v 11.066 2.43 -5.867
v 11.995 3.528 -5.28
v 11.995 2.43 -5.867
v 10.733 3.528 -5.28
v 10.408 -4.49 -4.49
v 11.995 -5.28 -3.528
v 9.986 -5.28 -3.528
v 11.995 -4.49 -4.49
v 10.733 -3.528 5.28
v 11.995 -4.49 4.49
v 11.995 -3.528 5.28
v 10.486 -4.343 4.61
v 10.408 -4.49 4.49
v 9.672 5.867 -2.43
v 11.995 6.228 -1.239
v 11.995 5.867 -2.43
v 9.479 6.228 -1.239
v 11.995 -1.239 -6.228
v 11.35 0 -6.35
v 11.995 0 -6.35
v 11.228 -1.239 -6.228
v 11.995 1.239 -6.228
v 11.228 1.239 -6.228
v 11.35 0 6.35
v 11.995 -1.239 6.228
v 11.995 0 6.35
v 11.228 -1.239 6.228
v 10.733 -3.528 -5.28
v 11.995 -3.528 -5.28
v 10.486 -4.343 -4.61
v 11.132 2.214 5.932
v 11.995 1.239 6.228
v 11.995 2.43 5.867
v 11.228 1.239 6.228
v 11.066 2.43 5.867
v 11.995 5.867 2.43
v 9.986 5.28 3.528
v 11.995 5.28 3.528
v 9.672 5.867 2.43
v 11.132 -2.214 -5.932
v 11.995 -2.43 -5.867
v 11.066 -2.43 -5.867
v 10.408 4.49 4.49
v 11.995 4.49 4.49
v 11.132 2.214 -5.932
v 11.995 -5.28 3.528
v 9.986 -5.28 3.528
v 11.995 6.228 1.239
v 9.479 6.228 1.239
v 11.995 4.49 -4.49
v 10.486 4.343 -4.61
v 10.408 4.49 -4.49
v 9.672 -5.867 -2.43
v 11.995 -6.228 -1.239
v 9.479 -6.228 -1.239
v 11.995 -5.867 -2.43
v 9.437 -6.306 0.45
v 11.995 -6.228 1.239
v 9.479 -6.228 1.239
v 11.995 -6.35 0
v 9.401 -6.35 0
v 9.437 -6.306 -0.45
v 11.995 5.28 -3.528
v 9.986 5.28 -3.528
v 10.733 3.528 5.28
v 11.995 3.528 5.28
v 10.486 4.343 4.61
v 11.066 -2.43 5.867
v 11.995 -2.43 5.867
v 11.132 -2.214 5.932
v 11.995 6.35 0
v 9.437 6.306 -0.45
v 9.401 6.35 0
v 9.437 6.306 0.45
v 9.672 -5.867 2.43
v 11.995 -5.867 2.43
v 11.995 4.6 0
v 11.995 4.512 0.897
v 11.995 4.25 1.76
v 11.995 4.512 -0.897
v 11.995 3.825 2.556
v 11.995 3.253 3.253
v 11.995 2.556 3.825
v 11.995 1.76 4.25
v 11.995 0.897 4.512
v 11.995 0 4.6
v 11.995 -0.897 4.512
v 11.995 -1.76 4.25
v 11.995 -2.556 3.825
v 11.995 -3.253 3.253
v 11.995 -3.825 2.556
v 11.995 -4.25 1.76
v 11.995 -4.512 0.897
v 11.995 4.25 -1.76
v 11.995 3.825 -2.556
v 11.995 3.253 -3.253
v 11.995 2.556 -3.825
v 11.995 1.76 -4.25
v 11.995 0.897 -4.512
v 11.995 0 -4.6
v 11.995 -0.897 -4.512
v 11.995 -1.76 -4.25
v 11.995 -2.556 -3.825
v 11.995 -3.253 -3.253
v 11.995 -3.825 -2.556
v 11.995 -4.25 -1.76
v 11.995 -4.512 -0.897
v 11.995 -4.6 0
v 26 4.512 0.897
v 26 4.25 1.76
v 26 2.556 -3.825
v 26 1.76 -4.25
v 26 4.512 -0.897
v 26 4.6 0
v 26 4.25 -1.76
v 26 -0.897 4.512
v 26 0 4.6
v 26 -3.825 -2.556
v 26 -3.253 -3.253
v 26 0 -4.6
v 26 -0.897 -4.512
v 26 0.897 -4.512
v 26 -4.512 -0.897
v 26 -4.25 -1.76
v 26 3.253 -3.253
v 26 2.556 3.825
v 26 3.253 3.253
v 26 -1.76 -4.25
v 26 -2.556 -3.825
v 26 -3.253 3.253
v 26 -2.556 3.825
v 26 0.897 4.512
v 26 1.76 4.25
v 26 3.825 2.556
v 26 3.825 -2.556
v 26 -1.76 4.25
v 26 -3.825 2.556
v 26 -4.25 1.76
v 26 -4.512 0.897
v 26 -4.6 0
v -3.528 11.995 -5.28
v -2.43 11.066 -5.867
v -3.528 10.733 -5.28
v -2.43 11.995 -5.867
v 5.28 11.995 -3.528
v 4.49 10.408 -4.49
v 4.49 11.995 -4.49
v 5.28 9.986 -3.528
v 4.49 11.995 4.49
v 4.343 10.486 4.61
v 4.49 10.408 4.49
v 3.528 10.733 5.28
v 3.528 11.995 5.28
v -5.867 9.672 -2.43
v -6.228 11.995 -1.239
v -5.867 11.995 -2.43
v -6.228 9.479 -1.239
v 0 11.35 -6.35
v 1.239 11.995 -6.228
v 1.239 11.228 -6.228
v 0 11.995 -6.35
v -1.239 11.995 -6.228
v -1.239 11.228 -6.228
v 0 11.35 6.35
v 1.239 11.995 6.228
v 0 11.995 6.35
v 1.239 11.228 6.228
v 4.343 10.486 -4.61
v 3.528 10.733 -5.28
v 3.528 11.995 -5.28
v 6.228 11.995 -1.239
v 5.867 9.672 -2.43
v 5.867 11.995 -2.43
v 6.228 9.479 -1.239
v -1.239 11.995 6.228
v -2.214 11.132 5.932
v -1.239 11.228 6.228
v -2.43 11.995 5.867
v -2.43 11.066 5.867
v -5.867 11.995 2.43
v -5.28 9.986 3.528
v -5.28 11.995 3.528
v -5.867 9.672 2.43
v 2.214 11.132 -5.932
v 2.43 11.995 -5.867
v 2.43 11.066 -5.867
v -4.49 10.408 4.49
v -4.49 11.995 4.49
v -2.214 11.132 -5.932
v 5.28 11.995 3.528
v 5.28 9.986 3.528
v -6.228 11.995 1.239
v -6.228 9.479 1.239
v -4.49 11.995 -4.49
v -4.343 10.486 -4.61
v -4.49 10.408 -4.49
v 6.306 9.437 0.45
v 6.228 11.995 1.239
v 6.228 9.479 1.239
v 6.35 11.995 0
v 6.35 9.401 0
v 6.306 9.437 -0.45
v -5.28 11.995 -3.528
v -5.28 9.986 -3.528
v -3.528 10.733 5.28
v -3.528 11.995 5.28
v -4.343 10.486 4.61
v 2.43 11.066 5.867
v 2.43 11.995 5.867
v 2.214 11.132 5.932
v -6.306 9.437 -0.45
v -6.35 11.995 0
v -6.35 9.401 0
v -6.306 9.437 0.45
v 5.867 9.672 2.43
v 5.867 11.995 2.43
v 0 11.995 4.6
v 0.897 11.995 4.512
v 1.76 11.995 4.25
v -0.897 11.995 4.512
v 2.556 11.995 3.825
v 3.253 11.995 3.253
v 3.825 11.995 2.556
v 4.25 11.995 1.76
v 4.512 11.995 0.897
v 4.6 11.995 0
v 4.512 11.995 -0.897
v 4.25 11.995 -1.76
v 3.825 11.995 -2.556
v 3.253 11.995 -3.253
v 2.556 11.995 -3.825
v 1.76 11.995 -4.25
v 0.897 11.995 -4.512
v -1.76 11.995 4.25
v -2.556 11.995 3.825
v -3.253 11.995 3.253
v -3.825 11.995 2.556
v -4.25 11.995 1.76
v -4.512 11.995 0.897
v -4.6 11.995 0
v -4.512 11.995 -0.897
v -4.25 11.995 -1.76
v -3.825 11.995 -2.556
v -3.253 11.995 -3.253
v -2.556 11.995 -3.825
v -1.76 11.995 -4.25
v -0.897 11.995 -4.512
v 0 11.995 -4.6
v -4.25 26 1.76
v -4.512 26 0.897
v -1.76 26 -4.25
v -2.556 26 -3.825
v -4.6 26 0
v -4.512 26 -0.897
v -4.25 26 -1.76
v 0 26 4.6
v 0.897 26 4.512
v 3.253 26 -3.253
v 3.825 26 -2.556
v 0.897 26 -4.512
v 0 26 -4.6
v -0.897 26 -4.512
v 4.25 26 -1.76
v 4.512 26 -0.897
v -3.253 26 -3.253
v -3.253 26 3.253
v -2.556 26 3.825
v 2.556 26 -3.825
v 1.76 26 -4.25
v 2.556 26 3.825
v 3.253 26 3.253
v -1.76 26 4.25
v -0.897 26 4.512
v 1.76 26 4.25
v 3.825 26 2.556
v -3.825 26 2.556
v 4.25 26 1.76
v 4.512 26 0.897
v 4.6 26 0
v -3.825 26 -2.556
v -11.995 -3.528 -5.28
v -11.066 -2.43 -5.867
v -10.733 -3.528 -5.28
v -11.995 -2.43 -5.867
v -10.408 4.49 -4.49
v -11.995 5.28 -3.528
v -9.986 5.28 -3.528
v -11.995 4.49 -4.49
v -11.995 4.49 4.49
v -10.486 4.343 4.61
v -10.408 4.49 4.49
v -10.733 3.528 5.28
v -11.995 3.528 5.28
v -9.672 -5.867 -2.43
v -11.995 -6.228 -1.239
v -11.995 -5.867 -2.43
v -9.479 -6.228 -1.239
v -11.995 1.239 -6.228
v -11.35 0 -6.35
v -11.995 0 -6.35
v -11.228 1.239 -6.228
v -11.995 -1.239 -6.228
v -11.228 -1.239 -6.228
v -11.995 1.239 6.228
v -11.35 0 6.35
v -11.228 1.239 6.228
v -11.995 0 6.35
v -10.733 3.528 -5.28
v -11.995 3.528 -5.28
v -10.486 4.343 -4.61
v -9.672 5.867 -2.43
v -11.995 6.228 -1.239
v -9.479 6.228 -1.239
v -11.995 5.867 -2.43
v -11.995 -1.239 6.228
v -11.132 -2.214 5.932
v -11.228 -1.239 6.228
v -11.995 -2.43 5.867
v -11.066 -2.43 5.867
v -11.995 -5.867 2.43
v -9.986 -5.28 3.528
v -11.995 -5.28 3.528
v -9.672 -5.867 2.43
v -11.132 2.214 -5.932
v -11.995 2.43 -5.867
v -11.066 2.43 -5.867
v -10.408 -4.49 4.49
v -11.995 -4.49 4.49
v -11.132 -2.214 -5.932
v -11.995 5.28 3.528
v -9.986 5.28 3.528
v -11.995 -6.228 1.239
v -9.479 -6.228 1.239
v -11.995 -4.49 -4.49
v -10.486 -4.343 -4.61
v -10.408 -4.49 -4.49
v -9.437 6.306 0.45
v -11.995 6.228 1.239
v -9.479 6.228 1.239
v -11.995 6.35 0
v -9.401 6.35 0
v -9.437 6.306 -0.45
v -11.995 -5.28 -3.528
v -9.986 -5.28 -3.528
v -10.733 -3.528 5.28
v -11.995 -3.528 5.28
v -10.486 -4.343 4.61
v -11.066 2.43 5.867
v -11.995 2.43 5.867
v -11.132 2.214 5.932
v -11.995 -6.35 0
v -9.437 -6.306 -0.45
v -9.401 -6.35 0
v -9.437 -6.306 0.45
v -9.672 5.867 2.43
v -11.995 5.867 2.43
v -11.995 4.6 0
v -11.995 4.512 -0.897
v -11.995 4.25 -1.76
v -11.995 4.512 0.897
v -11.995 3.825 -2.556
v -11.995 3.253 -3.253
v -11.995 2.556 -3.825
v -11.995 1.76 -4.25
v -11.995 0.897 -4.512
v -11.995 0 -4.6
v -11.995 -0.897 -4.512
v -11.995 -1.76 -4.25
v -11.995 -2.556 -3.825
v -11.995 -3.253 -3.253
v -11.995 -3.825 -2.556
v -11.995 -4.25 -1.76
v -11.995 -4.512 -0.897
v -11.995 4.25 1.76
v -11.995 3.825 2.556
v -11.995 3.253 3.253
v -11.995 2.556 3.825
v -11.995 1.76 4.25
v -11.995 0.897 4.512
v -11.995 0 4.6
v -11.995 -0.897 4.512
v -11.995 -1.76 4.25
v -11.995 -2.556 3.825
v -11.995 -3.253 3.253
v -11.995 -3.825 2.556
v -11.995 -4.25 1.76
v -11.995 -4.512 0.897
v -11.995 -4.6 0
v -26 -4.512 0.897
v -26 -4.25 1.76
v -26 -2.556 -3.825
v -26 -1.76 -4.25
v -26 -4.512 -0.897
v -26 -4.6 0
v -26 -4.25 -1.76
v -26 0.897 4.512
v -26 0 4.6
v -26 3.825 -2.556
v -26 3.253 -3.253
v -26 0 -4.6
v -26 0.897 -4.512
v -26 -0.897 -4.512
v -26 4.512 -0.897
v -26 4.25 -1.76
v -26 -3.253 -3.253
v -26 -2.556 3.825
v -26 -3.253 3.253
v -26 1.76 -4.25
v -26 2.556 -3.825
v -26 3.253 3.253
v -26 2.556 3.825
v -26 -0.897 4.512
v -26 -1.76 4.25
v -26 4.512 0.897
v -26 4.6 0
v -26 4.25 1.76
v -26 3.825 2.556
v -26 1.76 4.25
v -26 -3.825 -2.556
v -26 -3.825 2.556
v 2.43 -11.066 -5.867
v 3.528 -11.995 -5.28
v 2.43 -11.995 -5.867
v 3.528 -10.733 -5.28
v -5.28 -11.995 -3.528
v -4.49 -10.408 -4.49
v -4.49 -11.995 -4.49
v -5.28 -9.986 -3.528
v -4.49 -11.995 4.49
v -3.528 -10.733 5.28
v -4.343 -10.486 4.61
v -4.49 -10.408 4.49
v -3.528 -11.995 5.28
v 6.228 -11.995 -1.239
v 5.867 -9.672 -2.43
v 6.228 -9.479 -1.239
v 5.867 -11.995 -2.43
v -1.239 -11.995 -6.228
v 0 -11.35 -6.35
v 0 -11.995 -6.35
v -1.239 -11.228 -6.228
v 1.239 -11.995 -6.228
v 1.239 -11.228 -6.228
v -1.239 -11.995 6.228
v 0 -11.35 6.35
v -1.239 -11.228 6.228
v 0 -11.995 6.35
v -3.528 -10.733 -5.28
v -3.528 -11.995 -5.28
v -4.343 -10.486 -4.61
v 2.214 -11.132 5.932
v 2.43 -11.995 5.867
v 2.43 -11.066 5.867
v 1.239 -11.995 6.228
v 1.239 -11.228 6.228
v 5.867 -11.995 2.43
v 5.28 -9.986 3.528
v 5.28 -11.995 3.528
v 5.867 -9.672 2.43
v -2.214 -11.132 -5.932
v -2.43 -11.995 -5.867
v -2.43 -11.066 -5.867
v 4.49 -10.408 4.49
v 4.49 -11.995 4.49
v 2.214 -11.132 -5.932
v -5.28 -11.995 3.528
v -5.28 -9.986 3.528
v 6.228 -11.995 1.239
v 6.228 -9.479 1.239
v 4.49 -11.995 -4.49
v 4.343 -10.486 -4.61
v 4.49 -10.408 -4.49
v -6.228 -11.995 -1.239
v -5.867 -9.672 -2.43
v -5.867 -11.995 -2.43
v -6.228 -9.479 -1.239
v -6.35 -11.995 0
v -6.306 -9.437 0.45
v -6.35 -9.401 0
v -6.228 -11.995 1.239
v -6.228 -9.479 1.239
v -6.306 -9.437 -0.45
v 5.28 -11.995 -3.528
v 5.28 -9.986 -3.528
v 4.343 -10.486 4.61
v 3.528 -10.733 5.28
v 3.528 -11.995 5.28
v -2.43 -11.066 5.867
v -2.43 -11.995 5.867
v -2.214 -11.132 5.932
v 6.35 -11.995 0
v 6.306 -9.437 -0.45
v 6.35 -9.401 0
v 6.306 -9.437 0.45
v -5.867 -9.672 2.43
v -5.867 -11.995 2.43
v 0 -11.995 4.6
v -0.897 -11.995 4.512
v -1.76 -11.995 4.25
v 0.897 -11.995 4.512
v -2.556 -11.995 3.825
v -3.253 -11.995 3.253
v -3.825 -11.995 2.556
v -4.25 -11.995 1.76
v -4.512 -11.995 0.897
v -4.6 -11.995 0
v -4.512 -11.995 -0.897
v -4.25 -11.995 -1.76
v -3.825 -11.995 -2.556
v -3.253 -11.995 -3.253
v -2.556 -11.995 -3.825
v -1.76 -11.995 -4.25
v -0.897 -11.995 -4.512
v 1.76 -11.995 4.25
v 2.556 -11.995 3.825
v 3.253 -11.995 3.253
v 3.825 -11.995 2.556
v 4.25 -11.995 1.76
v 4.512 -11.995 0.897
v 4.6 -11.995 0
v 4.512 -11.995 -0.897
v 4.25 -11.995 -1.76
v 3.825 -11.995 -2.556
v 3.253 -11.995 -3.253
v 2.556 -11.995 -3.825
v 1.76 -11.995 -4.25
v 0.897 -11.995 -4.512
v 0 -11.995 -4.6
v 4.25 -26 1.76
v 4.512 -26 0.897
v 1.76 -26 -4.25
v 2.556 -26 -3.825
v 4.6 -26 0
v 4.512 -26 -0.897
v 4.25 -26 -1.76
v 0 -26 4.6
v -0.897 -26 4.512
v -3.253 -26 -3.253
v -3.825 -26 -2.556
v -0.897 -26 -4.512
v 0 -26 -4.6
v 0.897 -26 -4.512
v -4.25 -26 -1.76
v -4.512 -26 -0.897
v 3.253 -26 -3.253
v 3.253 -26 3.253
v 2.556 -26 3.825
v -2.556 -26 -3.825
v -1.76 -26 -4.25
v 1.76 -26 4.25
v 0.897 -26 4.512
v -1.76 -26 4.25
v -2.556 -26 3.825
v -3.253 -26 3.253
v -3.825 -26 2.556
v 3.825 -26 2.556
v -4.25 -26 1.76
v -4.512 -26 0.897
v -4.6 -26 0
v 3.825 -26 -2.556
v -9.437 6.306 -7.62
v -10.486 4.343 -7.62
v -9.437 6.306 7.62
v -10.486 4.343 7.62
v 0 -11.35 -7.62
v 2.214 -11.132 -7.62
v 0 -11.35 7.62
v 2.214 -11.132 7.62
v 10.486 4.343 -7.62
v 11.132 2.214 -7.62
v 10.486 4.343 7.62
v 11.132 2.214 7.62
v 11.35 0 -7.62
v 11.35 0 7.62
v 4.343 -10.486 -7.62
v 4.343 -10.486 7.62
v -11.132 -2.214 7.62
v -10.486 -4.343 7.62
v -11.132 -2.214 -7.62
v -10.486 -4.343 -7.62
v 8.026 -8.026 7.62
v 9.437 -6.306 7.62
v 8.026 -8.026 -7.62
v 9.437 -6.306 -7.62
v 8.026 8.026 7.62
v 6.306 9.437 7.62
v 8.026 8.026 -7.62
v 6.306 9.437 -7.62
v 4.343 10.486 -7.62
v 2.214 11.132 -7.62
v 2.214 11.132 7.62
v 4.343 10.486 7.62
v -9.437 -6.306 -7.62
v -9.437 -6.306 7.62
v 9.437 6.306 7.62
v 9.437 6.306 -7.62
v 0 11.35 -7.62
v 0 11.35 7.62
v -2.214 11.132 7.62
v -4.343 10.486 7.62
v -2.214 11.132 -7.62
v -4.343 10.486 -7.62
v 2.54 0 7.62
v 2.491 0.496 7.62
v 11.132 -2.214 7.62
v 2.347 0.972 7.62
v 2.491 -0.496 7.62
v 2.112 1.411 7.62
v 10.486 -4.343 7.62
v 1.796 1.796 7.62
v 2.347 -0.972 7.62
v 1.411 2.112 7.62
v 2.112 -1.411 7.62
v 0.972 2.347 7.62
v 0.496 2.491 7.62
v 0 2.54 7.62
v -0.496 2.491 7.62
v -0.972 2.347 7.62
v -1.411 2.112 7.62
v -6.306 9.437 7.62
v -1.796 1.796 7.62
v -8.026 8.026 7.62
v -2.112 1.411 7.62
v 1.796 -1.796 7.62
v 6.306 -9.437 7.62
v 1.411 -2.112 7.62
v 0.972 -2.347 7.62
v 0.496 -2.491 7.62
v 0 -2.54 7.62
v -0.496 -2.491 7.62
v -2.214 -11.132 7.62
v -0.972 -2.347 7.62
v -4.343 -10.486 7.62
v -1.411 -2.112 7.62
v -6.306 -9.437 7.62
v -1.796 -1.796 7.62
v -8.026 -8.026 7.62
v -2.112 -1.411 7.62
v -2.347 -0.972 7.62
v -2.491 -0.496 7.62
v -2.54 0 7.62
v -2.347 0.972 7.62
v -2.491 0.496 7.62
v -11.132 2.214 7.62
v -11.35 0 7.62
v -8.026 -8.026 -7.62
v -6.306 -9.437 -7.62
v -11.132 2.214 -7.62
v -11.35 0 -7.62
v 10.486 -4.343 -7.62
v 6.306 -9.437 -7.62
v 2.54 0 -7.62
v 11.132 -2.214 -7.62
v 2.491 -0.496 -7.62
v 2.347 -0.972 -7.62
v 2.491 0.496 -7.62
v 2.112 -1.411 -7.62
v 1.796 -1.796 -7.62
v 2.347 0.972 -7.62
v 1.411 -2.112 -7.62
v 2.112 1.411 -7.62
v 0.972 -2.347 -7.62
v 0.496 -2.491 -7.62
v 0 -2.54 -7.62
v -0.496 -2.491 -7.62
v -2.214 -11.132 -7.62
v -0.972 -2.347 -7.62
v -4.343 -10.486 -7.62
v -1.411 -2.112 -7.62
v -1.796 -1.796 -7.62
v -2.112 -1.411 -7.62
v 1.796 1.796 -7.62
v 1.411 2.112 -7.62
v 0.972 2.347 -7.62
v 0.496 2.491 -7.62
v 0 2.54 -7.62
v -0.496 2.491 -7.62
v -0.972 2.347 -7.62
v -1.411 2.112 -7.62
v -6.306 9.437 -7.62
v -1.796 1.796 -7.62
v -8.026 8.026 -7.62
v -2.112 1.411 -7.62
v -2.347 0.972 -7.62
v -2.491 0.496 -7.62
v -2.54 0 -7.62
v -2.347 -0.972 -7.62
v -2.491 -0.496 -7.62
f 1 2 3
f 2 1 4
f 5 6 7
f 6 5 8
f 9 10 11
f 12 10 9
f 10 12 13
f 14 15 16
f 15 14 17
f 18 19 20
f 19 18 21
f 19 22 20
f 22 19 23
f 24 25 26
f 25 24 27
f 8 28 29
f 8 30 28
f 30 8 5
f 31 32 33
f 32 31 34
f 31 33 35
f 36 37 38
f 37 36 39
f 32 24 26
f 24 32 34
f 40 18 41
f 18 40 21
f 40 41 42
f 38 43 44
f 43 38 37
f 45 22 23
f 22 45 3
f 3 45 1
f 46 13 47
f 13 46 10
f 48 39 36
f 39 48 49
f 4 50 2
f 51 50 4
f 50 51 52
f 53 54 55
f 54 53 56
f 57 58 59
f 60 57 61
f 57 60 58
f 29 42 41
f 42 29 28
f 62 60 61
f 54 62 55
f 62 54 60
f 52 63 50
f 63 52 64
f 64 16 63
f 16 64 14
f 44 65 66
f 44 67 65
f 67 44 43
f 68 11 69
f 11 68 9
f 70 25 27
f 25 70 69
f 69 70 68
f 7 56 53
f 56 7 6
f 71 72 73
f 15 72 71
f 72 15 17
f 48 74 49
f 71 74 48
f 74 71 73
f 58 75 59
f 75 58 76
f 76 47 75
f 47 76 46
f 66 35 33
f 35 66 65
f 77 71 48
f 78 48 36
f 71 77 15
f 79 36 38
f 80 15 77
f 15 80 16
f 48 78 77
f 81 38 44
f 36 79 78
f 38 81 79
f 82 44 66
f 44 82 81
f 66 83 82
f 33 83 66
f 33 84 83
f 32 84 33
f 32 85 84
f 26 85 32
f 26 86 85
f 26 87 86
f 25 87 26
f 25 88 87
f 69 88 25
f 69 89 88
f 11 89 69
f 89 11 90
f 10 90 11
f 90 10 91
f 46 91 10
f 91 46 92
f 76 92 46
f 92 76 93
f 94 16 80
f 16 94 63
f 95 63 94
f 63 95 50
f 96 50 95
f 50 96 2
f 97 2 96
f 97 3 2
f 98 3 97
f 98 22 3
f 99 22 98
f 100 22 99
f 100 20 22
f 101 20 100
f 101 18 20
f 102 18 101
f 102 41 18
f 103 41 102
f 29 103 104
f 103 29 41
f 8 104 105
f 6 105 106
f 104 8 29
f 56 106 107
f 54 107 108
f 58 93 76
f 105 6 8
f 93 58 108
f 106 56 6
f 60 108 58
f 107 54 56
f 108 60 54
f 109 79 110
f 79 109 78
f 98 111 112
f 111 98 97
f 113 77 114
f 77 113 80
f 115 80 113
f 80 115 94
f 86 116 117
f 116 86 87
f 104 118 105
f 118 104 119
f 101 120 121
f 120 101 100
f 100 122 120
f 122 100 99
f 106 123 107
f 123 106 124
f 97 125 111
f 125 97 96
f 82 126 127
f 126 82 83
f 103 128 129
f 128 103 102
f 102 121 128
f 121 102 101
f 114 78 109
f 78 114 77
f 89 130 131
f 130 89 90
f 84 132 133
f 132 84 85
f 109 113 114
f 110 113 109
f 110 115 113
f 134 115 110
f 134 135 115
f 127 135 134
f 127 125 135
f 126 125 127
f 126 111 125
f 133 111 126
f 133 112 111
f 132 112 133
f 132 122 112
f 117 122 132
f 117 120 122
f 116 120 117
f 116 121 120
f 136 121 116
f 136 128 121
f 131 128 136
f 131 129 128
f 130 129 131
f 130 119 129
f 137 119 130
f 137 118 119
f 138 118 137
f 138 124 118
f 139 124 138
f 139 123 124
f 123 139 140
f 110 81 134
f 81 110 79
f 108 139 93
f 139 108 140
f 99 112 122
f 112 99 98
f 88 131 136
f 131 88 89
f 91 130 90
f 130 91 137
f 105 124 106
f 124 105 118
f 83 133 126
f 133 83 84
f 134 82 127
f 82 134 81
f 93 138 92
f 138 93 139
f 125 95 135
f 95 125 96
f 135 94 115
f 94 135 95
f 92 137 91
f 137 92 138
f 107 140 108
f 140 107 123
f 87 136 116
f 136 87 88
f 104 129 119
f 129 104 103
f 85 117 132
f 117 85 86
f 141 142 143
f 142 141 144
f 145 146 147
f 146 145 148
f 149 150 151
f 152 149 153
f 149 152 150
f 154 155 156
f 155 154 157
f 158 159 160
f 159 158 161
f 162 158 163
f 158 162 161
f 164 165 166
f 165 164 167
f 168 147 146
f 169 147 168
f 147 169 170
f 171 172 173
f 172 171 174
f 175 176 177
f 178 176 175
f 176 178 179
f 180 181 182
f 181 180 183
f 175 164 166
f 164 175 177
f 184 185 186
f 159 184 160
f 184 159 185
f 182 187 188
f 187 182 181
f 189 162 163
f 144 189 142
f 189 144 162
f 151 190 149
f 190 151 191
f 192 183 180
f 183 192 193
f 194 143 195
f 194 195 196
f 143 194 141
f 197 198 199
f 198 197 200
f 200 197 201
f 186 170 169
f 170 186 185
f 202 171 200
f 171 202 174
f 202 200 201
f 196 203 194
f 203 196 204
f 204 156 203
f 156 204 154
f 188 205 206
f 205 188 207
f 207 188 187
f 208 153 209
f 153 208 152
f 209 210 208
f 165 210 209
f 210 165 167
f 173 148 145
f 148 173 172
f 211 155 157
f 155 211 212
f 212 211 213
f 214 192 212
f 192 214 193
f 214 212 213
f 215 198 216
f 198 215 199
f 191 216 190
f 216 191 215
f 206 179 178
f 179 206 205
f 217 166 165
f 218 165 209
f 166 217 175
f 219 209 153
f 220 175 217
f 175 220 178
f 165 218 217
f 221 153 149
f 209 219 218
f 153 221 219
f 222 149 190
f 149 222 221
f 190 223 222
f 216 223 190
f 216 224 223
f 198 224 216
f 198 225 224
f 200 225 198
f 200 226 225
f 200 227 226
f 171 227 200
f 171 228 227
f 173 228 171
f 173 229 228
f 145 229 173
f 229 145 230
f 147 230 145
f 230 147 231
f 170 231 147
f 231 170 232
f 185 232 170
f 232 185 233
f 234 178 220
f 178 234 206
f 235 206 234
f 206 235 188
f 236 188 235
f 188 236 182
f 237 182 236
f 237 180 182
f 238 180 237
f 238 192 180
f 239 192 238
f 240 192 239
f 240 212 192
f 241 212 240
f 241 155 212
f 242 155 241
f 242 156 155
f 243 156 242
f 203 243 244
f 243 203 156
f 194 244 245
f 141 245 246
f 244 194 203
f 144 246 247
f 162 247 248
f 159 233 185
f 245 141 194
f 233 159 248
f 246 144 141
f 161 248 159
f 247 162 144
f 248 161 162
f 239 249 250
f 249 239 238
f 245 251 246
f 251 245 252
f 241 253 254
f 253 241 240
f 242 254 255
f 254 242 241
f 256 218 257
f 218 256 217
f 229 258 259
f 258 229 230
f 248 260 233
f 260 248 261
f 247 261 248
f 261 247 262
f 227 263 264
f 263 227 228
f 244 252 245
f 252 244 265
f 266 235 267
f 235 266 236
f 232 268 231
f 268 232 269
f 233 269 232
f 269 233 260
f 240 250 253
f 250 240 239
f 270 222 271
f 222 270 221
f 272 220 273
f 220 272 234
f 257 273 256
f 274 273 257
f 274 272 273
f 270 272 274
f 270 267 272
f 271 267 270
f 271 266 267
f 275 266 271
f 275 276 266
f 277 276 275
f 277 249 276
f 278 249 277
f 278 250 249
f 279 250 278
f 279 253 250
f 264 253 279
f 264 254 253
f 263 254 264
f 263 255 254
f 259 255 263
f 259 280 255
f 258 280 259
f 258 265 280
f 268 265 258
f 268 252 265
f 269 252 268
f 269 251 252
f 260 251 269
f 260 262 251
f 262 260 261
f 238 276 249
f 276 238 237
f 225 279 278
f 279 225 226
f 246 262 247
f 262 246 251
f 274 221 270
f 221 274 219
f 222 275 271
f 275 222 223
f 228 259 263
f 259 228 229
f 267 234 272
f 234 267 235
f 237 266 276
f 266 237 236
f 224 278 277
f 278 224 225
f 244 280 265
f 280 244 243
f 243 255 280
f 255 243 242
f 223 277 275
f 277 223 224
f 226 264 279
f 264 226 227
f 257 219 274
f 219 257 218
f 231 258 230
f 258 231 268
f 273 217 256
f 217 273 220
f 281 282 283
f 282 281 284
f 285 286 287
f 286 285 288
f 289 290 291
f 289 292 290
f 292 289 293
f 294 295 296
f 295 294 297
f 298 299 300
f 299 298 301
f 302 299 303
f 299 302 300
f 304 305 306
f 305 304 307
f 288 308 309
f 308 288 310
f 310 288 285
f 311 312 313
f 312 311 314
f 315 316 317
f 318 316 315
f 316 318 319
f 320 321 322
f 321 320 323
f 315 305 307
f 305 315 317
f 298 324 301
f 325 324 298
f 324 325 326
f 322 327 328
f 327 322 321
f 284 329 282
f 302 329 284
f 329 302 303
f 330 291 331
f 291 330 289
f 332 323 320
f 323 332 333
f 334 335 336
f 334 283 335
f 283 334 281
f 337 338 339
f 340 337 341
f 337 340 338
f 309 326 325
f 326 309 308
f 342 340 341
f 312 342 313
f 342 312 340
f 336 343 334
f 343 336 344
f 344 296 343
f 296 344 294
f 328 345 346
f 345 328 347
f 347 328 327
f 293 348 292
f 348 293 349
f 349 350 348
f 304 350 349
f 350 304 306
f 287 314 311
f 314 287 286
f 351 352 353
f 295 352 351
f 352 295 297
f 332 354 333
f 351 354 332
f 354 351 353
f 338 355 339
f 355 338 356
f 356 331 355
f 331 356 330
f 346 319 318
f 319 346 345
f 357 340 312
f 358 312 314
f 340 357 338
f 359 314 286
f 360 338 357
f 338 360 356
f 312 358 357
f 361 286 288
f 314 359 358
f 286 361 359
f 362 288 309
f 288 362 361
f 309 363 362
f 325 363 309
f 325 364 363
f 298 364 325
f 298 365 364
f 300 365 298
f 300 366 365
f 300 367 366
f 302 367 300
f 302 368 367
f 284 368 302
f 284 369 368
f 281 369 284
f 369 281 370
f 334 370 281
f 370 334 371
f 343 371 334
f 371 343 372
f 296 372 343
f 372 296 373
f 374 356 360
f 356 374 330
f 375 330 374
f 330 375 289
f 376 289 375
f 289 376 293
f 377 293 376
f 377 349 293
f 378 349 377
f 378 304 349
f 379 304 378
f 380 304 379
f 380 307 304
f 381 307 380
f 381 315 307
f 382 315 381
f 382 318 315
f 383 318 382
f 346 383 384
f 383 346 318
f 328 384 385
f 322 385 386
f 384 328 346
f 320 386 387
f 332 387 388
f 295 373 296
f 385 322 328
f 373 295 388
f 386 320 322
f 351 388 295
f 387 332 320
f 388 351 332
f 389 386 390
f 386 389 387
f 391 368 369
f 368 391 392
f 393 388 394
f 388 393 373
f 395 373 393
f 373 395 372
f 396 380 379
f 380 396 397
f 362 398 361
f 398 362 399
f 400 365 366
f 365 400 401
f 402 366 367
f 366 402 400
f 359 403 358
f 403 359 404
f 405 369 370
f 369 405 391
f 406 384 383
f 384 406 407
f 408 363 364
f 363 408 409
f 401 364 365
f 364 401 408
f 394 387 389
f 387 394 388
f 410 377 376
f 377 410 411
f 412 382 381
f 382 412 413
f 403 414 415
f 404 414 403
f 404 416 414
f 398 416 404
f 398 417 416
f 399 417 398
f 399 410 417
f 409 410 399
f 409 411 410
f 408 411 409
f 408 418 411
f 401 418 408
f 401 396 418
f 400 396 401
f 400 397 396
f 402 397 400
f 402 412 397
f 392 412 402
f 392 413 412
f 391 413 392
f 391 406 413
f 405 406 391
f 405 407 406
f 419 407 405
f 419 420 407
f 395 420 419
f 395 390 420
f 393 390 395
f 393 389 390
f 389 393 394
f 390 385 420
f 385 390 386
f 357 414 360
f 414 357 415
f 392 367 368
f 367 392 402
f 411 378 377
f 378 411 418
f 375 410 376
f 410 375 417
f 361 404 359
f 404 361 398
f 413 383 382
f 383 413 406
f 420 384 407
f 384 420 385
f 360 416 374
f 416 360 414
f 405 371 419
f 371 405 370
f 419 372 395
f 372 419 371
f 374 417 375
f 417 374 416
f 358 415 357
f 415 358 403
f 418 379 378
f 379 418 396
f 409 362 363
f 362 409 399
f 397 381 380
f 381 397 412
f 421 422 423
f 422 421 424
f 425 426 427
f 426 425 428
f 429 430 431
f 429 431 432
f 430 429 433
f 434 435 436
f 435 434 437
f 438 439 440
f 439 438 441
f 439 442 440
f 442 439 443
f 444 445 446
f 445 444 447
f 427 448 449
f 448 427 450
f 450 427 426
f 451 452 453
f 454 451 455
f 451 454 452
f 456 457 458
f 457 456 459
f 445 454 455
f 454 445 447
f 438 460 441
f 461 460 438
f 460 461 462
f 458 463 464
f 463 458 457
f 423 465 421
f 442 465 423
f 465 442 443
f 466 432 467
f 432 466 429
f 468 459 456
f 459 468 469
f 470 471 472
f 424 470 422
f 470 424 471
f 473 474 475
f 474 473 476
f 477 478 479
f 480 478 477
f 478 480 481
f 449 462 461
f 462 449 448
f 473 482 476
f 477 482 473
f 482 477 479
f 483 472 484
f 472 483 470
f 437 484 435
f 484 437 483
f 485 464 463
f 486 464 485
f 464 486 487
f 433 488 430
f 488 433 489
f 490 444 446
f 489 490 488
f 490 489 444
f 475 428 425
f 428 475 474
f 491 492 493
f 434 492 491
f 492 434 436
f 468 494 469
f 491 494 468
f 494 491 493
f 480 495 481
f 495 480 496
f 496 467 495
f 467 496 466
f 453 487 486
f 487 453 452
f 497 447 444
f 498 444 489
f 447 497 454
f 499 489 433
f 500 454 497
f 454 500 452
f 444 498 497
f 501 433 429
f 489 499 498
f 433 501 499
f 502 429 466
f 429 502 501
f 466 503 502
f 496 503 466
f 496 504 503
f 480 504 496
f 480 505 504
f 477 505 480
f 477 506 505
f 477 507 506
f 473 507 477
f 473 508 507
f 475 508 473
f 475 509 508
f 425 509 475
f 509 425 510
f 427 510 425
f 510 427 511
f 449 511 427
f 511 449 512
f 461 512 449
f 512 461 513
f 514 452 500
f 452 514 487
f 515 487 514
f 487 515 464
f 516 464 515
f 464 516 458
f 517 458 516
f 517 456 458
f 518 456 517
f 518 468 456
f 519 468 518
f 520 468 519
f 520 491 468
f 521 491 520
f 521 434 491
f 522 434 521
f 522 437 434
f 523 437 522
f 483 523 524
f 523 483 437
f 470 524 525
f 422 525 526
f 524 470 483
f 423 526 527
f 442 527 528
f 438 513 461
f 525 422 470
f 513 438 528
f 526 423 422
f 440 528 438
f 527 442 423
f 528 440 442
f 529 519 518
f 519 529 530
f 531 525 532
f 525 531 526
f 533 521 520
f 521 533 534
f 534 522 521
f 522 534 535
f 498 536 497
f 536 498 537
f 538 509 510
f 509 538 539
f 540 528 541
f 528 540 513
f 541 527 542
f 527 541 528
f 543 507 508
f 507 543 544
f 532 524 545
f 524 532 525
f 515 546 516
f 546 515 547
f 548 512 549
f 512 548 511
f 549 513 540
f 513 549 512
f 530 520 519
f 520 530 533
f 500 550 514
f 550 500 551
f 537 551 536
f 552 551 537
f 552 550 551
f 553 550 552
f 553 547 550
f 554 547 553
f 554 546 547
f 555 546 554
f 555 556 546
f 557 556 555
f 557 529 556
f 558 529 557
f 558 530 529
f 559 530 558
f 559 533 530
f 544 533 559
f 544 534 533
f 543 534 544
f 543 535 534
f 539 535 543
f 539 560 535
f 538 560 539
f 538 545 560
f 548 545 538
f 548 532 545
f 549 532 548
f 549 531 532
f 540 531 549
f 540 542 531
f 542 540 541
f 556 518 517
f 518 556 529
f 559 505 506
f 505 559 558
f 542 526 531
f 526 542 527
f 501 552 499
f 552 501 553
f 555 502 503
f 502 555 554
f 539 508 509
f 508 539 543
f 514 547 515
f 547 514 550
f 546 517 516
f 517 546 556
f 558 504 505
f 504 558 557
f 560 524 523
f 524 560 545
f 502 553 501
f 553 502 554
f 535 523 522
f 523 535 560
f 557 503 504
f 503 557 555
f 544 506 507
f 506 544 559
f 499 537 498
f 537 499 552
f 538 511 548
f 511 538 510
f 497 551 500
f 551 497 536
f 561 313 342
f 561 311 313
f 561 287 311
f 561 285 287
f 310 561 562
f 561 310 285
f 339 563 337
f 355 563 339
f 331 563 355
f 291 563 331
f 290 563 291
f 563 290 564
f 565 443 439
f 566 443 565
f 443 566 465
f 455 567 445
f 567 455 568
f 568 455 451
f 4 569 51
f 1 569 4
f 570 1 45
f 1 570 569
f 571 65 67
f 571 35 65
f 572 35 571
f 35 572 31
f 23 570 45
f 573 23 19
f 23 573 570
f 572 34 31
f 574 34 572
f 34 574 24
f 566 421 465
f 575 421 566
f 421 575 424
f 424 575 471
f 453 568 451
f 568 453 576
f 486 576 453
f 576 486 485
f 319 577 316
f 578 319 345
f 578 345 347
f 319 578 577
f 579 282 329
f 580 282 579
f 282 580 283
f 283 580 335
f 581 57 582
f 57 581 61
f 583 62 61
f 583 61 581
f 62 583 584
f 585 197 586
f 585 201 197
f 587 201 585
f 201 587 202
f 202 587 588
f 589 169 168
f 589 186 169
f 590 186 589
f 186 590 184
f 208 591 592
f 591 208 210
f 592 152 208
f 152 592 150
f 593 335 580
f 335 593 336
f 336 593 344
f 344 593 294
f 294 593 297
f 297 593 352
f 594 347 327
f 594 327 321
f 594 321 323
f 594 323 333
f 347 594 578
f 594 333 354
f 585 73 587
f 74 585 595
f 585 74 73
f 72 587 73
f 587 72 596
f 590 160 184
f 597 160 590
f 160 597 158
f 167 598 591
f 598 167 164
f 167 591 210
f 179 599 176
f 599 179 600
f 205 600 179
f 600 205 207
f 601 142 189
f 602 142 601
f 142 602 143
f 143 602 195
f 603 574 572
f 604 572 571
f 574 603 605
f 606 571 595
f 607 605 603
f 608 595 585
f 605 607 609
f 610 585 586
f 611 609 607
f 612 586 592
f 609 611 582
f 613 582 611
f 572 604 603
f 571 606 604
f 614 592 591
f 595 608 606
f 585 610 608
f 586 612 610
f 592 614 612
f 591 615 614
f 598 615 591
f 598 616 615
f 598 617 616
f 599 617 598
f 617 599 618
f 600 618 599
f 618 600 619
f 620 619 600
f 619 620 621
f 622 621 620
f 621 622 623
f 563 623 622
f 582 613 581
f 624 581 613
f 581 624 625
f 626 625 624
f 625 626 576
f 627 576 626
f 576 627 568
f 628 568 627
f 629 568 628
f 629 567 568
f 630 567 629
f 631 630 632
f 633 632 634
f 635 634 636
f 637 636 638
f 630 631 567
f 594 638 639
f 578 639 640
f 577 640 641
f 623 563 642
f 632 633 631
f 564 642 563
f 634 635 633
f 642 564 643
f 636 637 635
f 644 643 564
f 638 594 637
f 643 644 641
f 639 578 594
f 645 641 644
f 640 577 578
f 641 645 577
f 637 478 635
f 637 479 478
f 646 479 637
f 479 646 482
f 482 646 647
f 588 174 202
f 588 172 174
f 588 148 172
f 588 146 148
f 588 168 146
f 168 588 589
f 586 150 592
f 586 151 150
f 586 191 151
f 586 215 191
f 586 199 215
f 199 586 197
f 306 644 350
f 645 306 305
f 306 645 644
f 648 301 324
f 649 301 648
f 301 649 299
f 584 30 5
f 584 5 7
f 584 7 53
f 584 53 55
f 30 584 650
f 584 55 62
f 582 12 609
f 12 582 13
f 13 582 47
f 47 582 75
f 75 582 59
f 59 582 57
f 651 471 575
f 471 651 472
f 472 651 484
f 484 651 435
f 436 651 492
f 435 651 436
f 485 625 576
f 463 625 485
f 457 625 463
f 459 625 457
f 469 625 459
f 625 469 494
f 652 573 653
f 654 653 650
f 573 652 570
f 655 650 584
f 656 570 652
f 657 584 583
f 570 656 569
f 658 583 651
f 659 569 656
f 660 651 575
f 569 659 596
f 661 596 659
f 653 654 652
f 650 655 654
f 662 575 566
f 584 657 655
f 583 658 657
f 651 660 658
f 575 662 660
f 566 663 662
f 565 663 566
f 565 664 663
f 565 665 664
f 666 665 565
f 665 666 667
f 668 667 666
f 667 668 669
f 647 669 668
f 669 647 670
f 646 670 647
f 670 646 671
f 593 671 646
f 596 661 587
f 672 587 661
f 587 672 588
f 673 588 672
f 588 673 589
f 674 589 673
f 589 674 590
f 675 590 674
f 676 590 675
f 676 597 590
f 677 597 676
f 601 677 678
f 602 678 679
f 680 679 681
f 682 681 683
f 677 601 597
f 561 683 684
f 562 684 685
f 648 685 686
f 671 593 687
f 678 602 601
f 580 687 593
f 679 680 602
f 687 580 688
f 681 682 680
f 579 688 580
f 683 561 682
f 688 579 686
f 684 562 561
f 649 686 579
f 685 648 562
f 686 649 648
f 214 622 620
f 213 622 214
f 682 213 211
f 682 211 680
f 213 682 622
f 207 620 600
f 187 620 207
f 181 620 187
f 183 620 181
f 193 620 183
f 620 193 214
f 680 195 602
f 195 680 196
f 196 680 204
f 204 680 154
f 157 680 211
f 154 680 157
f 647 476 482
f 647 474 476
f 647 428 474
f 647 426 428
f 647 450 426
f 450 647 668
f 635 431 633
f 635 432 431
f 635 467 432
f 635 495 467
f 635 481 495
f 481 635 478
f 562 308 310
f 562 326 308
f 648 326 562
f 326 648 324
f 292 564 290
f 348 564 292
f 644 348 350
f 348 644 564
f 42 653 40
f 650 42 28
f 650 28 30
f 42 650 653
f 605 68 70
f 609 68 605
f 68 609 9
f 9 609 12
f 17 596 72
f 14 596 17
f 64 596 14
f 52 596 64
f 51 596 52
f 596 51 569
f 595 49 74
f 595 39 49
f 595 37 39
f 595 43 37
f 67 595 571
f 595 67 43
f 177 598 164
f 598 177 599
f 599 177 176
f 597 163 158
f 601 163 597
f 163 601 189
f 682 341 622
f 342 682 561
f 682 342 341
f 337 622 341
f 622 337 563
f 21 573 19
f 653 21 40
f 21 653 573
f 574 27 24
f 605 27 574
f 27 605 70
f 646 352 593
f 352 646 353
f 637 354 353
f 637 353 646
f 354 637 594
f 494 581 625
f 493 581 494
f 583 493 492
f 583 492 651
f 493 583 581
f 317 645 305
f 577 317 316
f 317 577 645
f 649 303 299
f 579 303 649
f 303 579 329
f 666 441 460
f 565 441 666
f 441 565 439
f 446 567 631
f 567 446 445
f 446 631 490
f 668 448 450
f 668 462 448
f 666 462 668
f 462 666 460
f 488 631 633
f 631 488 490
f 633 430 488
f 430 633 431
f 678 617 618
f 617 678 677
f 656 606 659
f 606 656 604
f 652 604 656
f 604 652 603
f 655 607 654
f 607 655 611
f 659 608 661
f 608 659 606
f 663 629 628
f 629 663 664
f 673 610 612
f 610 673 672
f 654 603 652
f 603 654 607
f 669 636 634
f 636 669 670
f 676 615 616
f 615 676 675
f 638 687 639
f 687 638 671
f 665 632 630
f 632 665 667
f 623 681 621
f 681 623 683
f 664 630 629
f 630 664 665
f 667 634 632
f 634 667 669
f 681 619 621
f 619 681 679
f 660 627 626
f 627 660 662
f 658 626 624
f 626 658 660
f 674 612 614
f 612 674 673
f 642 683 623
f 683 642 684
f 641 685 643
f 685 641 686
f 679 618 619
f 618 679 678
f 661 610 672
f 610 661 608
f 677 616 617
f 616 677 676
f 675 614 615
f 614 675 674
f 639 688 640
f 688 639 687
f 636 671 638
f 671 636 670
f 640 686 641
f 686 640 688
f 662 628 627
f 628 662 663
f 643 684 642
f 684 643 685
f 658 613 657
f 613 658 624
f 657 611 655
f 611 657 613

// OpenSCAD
$fn = 32;

// ----------------------------------------------------------------------
// Cardan cross: 52 mm span, 12.7 mm trunnions
// ----------------------------------------------------------------------

// --- parameters (mm) ---
journal_d = 12.7;         // trunnion diameter
arm_len = 26;             // trunnion length from the centre
step_r = 4.32;            // step position from the centre
step_d = 9.2;             // journal diameter after the step
hub_d = 22.7;             // hub diameter
hub_h = 15.24;            // hub height
bore_d = 5.08;            // hub bore

difference() {
  union() {
    /* hub along the joint axis */
    cylinder(h = hub_h, d = hub_d, center = true);
    for (a = [0 : 90 : 270]) rotate([0, 0, a]) {
      /* trunnion, sunk into the hub */
      translate([hub_d / 4, 0, 0]) rotate([0, 90, 0]) cylinder(h = step_r + 2, d = journal_d);
      /* stepped journal out to the tip */
      translate([step_r - 0.5, 0, 0]) rotate([0, 90, 0]) cylinder(h = arm_len + 0.5 - step_r, d = step_d);
    }
  }
  /* lubrication bore through the hub, 2.5 mm clear on both sides */
  translate([0, 0, -hub_h / 2 - 2.5]) cylinder(h = hub_h + 5, d = bore_d);
}
